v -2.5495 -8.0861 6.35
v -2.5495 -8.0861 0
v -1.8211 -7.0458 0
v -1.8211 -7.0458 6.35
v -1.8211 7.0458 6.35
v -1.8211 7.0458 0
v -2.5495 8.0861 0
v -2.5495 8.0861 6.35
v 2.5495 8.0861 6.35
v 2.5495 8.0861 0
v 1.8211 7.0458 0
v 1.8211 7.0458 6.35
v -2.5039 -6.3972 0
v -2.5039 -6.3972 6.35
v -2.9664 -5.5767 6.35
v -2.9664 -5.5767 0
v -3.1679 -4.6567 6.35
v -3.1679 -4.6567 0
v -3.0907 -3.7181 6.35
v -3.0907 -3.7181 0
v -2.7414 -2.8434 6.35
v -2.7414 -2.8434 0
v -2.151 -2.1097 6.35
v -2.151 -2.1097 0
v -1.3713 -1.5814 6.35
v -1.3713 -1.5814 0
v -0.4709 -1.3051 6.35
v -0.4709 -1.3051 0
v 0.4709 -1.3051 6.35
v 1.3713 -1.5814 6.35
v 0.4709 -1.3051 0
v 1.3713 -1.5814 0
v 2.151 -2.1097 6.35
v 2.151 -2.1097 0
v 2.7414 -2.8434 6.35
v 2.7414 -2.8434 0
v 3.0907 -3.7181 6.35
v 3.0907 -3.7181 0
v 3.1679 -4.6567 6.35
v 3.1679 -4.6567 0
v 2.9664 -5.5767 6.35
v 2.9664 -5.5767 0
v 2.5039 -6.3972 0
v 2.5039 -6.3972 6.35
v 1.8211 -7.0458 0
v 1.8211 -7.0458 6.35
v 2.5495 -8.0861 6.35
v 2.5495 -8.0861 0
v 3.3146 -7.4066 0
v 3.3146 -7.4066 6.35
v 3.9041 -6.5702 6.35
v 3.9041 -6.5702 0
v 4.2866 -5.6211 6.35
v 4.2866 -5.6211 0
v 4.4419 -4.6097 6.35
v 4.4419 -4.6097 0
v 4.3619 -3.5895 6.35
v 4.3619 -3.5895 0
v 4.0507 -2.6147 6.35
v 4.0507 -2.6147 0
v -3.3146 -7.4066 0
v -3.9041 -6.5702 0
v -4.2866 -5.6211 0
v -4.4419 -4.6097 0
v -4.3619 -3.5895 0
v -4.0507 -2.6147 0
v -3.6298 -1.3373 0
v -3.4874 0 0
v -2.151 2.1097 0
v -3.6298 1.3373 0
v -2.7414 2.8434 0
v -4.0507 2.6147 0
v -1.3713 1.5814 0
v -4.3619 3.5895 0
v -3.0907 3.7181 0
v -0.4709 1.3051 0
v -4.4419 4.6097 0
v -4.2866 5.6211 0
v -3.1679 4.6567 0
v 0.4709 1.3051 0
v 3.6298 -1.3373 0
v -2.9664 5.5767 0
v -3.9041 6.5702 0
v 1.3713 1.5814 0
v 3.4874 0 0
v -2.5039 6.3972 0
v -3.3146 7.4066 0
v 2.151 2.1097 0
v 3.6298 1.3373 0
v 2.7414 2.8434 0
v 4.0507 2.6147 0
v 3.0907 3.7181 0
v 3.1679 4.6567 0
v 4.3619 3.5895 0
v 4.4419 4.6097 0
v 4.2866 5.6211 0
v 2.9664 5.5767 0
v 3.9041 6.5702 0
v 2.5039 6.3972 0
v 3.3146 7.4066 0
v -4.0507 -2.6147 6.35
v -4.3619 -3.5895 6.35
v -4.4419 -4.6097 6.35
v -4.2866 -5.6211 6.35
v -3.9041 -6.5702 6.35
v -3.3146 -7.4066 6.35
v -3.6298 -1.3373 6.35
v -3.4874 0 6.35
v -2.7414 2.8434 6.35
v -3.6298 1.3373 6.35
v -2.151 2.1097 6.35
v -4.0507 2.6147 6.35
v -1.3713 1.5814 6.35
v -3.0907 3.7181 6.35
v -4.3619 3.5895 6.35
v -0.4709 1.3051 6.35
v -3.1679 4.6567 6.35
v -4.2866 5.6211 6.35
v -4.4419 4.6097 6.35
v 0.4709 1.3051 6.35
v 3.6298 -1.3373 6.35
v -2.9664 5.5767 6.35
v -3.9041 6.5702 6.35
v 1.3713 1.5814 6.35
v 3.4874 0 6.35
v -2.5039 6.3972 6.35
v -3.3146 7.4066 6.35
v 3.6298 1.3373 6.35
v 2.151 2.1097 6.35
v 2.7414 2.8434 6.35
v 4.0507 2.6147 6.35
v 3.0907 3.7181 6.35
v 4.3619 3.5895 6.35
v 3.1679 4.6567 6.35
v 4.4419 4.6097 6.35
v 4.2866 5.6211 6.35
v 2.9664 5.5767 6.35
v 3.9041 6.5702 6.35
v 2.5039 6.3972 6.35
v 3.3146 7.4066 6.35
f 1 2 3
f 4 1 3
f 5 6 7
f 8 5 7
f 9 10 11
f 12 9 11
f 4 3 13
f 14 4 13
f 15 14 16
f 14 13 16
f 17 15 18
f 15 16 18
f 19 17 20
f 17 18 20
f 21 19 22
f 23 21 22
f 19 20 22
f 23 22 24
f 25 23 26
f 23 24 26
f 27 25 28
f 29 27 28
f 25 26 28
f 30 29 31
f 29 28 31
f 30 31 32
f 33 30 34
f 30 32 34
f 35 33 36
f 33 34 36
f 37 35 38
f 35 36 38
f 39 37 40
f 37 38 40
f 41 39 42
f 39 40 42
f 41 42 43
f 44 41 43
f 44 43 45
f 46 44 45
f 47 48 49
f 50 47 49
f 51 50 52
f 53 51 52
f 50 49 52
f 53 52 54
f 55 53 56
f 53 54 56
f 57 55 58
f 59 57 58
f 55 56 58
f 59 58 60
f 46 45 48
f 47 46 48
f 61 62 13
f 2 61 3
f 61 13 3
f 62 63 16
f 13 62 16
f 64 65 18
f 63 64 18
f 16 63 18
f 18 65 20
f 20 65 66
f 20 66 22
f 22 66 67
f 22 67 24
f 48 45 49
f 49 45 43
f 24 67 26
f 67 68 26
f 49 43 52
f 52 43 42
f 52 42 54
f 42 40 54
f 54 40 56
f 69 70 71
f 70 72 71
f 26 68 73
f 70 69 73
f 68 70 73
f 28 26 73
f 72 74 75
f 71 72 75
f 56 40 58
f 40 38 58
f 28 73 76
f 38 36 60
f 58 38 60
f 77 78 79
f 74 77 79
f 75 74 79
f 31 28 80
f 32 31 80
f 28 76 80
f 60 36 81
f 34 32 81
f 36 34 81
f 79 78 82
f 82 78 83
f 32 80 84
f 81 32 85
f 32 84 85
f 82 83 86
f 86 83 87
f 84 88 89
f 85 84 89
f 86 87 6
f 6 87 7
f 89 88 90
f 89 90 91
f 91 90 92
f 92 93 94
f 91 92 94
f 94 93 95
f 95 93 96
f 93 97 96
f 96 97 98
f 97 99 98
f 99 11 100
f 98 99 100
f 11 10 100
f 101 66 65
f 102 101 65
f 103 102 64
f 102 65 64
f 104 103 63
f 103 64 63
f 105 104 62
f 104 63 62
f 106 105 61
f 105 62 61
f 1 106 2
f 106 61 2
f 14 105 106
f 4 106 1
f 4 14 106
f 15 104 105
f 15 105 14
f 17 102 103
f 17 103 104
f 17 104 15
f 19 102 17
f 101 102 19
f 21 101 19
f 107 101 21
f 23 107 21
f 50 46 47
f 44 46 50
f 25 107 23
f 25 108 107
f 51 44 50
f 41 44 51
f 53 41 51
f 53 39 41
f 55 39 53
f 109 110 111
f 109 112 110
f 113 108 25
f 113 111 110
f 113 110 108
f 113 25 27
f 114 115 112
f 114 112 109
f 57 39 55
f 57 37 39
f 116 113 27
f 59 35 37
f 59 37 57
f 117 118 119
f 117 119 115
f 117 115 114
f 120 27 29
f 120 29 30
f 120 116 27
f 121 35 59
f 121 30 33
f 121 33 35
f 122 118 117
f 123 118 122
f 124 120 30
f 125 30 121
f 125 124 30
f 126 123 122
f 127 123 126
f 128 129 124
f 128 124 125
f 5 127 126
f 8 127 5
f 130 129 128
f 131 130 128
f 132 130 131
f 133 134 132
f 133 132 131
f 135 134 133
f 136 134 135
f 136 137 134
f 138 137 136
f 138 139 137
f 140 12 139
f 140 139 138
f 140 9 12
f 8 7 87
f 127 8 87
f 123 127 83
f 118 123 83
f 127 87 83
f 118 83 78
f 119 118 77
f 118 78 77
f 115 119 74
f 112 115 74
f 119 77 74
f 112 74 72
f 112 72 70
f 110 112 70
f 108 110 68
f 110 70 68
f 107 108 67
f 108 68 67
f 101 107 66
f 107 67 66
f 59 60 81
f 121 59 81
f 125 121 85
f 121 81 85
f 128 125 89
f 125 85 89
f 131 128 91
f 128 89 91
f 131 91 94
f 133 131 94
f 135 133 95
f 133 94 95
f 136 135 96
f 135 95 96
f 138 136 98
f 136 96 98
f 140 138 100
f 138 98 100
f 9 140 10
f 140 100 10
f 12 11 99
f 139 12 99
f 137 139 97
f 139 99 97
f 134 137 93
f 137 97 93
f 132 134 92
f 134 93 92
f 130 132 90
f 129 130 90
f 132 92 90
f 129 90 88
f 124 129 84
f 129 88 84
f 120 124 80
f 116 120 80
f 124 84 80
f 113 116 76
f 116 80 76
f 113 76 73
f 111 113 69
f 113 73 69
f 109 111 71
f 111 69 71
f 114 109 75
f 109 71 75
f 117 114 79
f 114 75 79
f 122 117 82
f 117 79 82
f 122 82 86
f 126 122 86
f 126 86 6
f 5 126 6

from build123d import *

# Parameters (mm, degrees)
F1_DEPTH = 6.35


with BuildPart() as f1:
    # F0 (on Top) → F1 (new body)
    with BuildSketch(Plane.XY):
        with BuildLine():
            ThreePointArc((1.821105, 7.045808), (0, 1.27), (-1.821105, 7.045808))
            Line((-1.821105, 7.045808), (-2.549547, 8.086131))
            ThreePointArc((-2.549547, 8.086131), (-4.286594, 5.621068), (-4.050685, 2.614706))
            ThreePointArc((-4.050685, 2.614706), (-3.487378, 0), (-4.050685, -2.614706))
            ThreePointArc((-4.050685, -2.614706), (-4.286594, -5.621068), (-2.549547, -8.086131))
            Line((-2.549547, -8.086131), (-1.821105, -7.045808))
            ThreePointArc((-1.821105, -7.045808), (0, -1.27), (1.821105, -7.045808))
            Line((1.821105, -7.045808), (2.549547, -8.086131))
            ThreePointArc((2.549547, -8.086131), (4.286594, -5.621068), (4.050685, -2.614706))
            ThreePointArc((4.050685, -2.614706), (3.487378, 0), (4.050685, 2.614706))
            ThreePointArc((4.050685, 2.614706), (4.286594, 5.621068), (2.549547, 8.086131))
            Line((2.549547, 8.086131), (1.821105, 7.045808))
        make_face()
    extrude(amount=F1_DEPTH)


solid = f1.part
